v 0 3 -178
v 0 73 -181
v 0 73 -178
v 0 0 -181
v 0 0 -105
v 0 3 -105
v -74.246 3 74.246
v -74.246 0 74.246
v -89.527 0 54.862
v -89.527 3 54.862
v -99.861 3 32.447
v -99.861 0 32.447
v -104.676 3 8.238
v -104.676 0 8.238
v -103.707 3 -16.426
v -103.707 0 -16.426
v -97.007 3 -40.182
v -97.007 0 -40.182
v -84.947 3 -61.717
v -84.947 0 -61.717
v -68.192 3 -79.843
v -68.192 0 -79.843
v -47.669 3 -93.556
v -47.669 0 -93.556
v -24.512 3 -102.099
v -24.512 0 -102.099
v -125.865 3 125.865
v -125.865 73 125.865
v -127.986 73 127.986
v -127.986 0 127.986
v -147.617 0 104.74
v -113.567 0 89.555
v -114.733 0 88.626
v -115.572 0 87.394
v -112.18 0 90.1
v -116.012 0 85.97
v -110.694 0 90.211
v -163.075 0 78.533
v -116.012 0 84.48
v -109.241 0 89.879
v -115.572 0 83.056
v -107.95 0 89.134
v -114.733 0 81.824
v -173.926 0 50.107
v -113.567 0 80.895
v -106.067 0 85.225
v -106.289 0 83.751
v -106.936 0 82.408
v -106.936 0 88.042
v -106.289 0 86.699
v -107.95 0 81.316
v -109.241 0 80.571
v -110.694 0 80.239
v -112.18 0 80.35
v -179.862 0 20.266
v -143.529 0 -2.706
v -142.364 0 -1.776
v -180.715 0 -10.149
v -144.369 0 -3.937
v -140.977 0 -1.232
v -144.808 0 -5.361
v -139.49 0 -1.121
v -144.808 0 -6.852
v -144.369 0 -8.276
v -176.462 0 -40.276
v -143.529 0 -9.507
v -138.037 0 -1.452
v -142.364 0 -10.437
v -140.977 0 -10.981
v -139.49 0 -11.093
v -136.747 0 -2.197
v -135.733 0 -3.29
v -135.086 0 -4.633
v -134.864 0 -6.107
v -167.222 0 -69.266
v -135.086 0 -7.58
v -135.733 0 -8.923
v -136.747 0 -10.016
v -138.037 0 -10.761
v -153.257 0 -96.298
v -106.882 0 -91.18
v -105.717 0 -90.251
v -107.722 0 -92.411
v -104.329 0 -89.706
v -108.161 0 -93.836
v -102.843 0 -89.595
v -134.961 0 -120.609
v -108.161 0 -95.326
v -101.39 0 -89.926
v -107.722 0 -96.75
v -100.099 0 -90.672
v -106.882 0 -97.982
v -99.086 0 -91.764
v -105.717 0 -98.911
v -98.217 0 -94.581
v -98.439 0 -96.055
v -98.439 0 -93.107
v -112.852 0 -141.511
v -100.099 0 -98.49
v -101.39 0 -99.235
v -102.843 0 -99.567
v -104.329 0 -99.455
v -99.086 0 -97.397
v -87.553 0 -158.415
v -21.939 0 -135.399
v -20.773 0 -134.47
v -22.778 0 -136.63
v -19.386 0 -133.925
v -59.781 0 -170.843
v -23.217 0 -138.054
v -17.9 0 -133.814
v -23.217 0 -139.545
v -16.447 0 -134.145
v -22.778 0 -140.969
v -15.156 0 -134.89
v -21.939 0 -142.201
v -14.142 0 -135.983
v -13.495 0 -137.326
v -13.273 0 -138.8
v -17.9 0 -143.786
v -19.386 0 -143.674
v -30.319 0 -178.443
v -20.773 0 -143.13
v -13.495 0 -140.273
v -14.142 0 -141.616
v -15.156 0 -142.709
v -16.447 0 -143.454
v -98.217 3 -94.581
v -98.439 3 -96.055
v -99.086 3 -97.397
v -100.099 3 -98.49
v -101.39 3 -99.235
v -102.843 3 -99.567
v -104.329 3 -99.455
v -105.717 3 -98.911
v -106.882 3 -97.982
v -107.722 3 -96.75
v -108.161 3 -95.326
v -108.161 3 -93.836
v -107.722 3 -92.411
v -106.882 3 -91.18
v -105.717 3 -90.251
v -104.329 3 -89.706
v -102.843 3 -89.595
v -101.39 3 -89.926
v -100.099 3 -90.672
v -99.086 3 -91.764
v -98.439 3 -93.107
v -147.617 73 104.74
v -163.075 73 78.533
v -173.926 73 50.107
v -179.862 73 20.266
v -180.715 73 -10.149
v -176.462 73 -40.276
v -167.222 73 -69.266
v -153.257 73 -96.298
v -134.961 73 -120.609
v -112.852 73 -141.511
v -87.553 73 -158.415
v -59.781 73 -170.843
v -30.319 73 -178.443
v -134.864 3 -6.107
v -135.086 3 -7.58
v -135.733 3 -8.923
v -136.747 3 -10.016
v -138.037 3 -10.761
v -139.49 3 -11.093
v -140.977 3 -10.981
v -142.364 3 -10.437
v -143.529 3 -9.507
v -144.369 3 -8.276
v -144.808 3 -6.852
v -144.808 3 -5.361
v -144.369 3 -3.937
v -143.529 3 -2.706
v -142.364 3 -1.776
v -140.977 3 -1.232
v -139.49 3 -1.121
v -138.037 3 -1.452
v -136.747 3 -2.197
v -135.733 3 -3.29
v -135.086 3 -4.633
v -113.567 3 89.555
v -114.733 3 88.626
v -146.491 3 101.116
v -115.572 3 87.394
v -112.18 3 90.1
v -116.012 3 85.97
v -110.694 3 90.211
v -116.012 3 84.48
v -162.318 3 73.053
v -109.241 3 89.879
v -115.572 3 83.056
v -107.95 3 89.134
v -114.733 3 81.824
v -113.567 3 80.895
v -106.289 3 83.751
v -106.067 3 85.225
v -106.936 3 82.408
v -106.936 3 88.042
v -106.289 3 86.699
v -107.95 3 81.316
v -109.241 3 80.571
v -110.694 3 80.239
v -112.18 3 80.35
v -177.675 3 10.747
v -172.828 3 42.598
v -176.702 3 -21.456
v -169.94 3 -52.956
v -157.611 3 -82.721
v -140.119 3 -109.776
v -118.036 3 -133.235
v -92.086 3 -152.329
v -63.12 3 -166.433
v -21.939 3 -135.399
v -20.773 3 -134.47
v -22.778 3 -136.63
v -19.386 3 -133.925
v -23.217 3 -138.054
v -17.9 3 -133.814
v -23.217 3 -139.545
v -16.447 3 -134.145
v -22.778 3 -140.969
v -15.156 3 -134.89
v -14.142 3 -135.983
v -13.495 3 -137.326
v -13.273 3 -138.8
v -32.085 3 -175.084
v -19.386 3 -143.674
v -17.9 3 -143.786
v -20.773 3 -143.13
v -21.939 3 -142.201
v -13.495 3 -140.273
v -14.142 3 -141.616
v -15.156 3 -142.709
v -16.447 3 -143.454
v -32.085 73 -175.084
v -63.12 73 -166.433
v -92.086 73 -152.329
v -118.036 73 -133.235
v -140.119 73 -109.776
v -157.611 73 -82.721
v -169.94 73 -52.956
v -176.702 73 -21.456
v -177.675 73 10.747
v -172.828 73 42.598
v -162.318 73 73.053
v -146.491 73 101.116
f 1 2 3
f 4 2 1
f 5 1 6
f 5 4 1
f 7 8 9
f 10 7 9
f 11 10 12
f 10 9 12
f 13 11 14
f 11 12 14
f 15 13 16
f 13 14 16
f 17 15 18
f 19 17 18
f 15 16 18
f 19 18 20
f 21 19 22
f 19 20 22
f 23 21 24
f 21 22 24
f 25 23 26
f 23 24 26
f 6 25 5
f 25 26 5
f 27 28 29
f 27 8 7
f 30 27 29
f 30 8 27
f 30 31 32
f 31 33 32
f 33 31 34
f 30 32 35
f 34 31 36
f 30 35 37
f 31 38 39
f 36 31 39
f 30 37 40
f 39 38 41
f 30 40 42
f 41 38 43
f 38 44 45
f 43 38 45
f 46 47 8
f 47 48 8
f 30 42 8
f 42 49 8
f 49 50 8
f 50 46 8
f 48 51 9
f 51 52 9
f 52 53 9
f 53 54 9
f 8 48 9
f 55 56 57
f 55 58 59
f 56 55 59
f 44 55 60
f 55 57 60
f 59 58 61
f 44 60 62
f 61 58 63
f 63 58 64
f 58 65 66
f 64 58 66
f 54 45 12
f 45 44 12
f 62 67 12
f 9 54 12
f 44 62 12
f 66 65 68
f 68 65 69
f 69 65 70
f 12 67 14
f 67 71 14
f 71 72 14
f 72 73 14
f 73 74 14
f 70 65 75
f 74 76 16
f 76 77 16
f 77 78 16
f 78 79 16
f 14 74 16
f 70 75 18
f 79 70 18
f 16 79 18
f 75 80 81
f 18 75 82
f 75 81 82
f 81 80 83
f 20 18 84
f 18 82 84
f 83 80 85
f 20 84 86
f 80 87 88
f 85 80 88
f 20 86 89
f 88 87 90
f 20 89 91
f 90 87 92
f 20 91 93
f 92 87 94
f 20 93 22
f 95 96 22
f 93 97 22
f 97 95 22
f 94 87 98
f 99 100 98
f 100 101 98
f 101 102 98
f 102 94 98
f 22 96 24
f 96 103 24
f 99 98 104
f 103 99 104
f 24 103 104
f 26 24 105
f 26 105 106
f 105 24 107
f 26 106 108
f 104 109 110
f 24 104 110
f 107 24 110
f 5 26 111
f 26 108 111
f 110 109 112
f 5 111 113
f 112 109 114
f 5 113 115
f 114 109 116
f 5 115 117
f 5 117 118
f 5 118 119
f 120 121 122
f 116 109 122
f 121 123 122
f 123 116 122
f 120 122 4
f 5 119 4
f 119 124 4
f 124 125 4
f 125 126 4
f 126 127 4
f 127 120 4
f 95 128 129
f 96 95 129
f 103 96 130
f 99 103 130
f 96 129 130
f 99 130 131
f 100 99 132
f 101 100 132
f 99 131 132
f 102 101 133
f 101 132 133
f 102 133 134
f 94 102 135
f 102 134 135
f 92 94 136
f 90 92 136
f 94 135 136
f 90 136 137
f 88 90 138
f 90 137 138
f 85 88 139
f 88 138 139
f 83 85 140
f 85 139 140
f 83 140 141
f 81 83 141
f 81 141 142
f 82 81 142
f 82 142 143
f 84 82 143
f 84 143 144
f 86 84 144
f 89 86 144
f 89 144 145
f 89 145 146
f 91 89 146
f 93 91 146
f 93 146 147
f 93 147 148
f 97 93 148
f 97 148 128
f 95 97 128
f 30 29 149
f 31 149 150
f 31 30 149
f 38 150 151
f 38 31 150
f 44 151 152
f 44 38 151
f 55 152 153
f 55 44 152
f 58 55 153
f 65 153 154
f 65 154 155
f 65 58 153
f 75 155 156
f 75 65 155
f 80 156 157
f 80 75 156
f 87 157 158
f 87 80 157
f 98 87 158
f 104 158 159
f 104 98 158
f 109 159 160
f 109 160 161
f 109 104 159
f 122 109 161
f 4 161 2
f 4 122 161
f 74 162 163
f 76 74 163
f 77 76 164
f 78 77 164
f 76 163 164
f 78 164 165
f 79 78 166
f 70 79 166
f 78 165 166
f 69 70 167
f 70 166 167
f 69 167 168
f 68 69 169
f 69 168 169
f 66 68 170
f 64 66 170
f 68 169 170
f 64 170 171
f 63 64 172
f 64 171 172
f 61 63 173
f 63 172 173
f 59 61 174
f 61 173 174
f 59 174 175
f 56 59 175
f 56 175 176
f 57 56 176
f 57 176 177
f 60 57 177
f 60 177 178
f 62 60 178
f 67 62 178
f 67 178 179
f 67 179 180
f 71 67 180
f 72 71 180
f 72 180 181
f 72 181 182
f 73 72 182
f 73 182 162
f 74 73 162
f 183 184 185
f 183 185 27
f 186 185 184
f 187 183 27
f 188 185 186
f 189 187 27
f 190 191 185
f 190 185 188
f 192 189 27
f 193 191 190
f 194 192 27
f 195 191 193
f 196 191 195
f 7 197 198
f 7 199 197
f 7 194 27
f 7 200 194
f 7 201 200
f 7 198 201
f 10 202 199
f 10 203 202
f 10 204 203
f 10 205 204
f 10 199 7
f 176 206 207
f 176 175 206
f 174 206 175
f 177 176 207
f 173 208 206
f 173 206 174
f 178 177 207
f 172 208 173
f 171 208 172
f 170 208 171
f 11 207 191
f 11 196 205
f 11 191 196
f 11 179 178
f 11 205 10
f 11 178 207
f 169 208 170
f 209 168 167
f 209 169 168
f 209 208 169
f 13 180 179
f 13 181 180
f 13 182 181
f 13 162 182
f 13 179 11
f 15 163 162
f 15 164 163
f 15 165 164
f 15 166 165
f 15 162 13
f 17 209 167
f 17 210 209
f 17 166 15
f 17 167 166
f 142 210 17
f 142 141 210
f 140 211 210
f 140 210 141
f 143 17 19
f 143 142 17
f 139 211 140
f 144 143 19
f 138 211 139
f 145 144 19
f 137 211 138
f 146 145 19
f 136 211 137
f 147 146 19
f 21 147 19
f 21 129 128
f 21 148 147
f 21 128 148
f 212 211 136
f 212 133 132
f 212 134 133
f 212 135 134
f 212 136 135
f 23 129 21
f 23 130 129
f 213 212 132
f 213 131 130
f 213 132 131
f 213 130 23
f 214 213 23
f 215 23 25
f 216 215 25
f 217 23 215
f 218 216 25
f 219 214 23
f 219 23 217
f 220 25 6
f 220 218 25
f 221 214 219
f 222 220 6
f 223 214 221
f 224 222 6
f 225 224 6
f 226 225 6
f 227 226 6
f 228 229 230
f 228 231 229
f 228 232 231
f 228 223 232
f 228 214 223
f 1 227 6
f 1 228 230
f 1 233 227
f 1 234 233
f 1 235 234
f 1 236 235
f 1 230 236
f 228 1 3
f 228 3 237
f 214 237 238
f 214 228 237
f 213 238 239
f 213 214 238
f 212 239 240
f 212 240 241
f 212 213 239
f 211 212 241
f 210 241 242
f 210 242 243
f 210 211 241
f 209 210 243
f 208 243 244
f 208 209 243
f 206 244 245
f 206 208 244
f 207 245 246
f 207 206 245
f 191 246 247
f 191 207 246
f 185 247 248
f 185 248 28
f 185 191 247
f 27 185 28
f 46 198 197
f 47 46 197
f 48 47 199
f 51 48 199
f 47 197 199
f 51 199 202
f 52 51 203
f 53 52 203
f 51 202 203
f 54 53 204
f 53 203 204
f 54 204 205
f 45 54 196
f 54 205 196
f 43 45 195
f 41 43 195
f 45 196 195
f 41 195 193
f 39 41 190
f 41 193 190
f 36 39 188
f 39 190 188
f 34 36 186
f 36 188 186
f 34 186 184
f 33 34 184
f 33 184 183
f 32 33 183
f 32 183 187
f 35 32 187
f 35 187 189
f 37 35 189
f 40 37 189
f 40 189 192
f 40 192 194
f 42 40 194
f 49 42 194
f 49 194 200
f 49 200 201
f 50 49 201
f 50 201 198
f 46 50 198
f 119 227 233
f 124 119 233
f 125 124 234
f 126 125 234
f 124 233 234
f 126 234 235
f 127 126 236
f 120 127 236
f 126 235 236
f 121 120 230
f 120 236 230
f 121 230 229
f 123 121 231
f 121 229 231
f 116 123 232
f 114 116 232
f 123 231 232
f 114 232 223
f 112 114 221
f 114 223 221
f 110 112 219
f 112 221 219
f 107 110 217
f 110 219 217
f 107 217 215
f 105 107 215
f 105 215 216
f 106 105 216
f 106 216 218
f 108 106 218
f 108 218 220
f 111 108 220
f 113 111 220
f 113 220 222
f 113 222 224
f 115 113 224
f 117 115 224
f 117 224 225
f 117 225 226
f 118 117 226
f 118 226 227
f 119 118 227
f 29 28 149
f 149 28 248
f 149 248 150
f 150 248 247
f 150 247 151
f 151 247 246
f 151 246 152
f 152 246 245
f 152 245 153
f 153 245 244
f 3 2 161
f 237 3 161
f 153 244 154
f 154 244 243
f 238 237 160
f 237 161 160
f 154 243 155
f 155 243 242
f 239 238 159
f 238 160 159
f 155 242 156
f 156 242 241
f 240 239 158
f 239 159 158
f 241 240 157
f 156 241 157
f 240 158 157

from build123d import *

# Parameters (mm, degrees)
BOSS_EXTRUDE3_DEPTH = 3
BOSS_EXTRUDE4_DEPTH = 70
SKETCH6_R           = 5
CUT_EXTRUDE2_DEPTH  = 10


with BuildPart() as part:
    # Sketch1 → Boss-Extrude3 (new body)
    with BuildSketch(Plane(origin=(0, 0, 0), x_dir=(1, 0, 0), z_dir=(0, 1, 0))):
        with BuildLine():
            Line((0, 105), (0, 181))
            ThreePointArc((0, 181), (-167.222195385, 69.265701258), (-127.986327395, -127.986327395))
            Line((-127.986327395, -127.986327395), (-74.246212025, -74.246212025))
            ThreePointArc((-74.246212025, -74.246212025), (-97.007350914, 40.181760398), (0, 105))
        make_face()
    extrude(amount=BOSS_EXTRUDE3_DEPTH)

    # Sketch5 → Boss-Extrude4 (add)
    with BuildSketch(Plane(origin=(0, 3, 0), x_dir=(1, 0, 0), z_dir=(0, 1, 0))):
        with BuildLine():
            Line((0, 181), (0, 178))
            ThreePointArc((0, 178), (-164.450556787, 68.117650961), (-125.865007051, -125.865007051))
            Line((-125.865007051, -125.865007051), (-127.986327395, -127.986327395))
            ThreePointArc((-127.986327395, -127.986327395), (-167.222195385, 69.265701258), (0, 181))
        make_face()
    extrude(amount=BOSS_EXTRUDE4_DEPTH)

    # Sketch6 → Cut-Extrude2 (cut)
    with BuildSketch(Plane(origin=(0, 3, 0), x_dir=(1, 0, 0), z_dir=(0, 1, 0))):
        with Locations((-139.864087078, 6.106597921)):
            Circle(SKETCH6_R)
        with Locations((-111.067352179, -85.224976811)):
            Circle(SKETCH6_R)
        with Locations((-103.216861218, 94.580827618)):
            Circle(SKETCH6_R)
        with Locations((-18.273318865, 138.799636924)):
            Circle(SKETCH6_R)
    extrude(amount=-CUT_EXTRUDE2_DEPTH, mode=Mode.SUBTRACT)


solid = part.part
